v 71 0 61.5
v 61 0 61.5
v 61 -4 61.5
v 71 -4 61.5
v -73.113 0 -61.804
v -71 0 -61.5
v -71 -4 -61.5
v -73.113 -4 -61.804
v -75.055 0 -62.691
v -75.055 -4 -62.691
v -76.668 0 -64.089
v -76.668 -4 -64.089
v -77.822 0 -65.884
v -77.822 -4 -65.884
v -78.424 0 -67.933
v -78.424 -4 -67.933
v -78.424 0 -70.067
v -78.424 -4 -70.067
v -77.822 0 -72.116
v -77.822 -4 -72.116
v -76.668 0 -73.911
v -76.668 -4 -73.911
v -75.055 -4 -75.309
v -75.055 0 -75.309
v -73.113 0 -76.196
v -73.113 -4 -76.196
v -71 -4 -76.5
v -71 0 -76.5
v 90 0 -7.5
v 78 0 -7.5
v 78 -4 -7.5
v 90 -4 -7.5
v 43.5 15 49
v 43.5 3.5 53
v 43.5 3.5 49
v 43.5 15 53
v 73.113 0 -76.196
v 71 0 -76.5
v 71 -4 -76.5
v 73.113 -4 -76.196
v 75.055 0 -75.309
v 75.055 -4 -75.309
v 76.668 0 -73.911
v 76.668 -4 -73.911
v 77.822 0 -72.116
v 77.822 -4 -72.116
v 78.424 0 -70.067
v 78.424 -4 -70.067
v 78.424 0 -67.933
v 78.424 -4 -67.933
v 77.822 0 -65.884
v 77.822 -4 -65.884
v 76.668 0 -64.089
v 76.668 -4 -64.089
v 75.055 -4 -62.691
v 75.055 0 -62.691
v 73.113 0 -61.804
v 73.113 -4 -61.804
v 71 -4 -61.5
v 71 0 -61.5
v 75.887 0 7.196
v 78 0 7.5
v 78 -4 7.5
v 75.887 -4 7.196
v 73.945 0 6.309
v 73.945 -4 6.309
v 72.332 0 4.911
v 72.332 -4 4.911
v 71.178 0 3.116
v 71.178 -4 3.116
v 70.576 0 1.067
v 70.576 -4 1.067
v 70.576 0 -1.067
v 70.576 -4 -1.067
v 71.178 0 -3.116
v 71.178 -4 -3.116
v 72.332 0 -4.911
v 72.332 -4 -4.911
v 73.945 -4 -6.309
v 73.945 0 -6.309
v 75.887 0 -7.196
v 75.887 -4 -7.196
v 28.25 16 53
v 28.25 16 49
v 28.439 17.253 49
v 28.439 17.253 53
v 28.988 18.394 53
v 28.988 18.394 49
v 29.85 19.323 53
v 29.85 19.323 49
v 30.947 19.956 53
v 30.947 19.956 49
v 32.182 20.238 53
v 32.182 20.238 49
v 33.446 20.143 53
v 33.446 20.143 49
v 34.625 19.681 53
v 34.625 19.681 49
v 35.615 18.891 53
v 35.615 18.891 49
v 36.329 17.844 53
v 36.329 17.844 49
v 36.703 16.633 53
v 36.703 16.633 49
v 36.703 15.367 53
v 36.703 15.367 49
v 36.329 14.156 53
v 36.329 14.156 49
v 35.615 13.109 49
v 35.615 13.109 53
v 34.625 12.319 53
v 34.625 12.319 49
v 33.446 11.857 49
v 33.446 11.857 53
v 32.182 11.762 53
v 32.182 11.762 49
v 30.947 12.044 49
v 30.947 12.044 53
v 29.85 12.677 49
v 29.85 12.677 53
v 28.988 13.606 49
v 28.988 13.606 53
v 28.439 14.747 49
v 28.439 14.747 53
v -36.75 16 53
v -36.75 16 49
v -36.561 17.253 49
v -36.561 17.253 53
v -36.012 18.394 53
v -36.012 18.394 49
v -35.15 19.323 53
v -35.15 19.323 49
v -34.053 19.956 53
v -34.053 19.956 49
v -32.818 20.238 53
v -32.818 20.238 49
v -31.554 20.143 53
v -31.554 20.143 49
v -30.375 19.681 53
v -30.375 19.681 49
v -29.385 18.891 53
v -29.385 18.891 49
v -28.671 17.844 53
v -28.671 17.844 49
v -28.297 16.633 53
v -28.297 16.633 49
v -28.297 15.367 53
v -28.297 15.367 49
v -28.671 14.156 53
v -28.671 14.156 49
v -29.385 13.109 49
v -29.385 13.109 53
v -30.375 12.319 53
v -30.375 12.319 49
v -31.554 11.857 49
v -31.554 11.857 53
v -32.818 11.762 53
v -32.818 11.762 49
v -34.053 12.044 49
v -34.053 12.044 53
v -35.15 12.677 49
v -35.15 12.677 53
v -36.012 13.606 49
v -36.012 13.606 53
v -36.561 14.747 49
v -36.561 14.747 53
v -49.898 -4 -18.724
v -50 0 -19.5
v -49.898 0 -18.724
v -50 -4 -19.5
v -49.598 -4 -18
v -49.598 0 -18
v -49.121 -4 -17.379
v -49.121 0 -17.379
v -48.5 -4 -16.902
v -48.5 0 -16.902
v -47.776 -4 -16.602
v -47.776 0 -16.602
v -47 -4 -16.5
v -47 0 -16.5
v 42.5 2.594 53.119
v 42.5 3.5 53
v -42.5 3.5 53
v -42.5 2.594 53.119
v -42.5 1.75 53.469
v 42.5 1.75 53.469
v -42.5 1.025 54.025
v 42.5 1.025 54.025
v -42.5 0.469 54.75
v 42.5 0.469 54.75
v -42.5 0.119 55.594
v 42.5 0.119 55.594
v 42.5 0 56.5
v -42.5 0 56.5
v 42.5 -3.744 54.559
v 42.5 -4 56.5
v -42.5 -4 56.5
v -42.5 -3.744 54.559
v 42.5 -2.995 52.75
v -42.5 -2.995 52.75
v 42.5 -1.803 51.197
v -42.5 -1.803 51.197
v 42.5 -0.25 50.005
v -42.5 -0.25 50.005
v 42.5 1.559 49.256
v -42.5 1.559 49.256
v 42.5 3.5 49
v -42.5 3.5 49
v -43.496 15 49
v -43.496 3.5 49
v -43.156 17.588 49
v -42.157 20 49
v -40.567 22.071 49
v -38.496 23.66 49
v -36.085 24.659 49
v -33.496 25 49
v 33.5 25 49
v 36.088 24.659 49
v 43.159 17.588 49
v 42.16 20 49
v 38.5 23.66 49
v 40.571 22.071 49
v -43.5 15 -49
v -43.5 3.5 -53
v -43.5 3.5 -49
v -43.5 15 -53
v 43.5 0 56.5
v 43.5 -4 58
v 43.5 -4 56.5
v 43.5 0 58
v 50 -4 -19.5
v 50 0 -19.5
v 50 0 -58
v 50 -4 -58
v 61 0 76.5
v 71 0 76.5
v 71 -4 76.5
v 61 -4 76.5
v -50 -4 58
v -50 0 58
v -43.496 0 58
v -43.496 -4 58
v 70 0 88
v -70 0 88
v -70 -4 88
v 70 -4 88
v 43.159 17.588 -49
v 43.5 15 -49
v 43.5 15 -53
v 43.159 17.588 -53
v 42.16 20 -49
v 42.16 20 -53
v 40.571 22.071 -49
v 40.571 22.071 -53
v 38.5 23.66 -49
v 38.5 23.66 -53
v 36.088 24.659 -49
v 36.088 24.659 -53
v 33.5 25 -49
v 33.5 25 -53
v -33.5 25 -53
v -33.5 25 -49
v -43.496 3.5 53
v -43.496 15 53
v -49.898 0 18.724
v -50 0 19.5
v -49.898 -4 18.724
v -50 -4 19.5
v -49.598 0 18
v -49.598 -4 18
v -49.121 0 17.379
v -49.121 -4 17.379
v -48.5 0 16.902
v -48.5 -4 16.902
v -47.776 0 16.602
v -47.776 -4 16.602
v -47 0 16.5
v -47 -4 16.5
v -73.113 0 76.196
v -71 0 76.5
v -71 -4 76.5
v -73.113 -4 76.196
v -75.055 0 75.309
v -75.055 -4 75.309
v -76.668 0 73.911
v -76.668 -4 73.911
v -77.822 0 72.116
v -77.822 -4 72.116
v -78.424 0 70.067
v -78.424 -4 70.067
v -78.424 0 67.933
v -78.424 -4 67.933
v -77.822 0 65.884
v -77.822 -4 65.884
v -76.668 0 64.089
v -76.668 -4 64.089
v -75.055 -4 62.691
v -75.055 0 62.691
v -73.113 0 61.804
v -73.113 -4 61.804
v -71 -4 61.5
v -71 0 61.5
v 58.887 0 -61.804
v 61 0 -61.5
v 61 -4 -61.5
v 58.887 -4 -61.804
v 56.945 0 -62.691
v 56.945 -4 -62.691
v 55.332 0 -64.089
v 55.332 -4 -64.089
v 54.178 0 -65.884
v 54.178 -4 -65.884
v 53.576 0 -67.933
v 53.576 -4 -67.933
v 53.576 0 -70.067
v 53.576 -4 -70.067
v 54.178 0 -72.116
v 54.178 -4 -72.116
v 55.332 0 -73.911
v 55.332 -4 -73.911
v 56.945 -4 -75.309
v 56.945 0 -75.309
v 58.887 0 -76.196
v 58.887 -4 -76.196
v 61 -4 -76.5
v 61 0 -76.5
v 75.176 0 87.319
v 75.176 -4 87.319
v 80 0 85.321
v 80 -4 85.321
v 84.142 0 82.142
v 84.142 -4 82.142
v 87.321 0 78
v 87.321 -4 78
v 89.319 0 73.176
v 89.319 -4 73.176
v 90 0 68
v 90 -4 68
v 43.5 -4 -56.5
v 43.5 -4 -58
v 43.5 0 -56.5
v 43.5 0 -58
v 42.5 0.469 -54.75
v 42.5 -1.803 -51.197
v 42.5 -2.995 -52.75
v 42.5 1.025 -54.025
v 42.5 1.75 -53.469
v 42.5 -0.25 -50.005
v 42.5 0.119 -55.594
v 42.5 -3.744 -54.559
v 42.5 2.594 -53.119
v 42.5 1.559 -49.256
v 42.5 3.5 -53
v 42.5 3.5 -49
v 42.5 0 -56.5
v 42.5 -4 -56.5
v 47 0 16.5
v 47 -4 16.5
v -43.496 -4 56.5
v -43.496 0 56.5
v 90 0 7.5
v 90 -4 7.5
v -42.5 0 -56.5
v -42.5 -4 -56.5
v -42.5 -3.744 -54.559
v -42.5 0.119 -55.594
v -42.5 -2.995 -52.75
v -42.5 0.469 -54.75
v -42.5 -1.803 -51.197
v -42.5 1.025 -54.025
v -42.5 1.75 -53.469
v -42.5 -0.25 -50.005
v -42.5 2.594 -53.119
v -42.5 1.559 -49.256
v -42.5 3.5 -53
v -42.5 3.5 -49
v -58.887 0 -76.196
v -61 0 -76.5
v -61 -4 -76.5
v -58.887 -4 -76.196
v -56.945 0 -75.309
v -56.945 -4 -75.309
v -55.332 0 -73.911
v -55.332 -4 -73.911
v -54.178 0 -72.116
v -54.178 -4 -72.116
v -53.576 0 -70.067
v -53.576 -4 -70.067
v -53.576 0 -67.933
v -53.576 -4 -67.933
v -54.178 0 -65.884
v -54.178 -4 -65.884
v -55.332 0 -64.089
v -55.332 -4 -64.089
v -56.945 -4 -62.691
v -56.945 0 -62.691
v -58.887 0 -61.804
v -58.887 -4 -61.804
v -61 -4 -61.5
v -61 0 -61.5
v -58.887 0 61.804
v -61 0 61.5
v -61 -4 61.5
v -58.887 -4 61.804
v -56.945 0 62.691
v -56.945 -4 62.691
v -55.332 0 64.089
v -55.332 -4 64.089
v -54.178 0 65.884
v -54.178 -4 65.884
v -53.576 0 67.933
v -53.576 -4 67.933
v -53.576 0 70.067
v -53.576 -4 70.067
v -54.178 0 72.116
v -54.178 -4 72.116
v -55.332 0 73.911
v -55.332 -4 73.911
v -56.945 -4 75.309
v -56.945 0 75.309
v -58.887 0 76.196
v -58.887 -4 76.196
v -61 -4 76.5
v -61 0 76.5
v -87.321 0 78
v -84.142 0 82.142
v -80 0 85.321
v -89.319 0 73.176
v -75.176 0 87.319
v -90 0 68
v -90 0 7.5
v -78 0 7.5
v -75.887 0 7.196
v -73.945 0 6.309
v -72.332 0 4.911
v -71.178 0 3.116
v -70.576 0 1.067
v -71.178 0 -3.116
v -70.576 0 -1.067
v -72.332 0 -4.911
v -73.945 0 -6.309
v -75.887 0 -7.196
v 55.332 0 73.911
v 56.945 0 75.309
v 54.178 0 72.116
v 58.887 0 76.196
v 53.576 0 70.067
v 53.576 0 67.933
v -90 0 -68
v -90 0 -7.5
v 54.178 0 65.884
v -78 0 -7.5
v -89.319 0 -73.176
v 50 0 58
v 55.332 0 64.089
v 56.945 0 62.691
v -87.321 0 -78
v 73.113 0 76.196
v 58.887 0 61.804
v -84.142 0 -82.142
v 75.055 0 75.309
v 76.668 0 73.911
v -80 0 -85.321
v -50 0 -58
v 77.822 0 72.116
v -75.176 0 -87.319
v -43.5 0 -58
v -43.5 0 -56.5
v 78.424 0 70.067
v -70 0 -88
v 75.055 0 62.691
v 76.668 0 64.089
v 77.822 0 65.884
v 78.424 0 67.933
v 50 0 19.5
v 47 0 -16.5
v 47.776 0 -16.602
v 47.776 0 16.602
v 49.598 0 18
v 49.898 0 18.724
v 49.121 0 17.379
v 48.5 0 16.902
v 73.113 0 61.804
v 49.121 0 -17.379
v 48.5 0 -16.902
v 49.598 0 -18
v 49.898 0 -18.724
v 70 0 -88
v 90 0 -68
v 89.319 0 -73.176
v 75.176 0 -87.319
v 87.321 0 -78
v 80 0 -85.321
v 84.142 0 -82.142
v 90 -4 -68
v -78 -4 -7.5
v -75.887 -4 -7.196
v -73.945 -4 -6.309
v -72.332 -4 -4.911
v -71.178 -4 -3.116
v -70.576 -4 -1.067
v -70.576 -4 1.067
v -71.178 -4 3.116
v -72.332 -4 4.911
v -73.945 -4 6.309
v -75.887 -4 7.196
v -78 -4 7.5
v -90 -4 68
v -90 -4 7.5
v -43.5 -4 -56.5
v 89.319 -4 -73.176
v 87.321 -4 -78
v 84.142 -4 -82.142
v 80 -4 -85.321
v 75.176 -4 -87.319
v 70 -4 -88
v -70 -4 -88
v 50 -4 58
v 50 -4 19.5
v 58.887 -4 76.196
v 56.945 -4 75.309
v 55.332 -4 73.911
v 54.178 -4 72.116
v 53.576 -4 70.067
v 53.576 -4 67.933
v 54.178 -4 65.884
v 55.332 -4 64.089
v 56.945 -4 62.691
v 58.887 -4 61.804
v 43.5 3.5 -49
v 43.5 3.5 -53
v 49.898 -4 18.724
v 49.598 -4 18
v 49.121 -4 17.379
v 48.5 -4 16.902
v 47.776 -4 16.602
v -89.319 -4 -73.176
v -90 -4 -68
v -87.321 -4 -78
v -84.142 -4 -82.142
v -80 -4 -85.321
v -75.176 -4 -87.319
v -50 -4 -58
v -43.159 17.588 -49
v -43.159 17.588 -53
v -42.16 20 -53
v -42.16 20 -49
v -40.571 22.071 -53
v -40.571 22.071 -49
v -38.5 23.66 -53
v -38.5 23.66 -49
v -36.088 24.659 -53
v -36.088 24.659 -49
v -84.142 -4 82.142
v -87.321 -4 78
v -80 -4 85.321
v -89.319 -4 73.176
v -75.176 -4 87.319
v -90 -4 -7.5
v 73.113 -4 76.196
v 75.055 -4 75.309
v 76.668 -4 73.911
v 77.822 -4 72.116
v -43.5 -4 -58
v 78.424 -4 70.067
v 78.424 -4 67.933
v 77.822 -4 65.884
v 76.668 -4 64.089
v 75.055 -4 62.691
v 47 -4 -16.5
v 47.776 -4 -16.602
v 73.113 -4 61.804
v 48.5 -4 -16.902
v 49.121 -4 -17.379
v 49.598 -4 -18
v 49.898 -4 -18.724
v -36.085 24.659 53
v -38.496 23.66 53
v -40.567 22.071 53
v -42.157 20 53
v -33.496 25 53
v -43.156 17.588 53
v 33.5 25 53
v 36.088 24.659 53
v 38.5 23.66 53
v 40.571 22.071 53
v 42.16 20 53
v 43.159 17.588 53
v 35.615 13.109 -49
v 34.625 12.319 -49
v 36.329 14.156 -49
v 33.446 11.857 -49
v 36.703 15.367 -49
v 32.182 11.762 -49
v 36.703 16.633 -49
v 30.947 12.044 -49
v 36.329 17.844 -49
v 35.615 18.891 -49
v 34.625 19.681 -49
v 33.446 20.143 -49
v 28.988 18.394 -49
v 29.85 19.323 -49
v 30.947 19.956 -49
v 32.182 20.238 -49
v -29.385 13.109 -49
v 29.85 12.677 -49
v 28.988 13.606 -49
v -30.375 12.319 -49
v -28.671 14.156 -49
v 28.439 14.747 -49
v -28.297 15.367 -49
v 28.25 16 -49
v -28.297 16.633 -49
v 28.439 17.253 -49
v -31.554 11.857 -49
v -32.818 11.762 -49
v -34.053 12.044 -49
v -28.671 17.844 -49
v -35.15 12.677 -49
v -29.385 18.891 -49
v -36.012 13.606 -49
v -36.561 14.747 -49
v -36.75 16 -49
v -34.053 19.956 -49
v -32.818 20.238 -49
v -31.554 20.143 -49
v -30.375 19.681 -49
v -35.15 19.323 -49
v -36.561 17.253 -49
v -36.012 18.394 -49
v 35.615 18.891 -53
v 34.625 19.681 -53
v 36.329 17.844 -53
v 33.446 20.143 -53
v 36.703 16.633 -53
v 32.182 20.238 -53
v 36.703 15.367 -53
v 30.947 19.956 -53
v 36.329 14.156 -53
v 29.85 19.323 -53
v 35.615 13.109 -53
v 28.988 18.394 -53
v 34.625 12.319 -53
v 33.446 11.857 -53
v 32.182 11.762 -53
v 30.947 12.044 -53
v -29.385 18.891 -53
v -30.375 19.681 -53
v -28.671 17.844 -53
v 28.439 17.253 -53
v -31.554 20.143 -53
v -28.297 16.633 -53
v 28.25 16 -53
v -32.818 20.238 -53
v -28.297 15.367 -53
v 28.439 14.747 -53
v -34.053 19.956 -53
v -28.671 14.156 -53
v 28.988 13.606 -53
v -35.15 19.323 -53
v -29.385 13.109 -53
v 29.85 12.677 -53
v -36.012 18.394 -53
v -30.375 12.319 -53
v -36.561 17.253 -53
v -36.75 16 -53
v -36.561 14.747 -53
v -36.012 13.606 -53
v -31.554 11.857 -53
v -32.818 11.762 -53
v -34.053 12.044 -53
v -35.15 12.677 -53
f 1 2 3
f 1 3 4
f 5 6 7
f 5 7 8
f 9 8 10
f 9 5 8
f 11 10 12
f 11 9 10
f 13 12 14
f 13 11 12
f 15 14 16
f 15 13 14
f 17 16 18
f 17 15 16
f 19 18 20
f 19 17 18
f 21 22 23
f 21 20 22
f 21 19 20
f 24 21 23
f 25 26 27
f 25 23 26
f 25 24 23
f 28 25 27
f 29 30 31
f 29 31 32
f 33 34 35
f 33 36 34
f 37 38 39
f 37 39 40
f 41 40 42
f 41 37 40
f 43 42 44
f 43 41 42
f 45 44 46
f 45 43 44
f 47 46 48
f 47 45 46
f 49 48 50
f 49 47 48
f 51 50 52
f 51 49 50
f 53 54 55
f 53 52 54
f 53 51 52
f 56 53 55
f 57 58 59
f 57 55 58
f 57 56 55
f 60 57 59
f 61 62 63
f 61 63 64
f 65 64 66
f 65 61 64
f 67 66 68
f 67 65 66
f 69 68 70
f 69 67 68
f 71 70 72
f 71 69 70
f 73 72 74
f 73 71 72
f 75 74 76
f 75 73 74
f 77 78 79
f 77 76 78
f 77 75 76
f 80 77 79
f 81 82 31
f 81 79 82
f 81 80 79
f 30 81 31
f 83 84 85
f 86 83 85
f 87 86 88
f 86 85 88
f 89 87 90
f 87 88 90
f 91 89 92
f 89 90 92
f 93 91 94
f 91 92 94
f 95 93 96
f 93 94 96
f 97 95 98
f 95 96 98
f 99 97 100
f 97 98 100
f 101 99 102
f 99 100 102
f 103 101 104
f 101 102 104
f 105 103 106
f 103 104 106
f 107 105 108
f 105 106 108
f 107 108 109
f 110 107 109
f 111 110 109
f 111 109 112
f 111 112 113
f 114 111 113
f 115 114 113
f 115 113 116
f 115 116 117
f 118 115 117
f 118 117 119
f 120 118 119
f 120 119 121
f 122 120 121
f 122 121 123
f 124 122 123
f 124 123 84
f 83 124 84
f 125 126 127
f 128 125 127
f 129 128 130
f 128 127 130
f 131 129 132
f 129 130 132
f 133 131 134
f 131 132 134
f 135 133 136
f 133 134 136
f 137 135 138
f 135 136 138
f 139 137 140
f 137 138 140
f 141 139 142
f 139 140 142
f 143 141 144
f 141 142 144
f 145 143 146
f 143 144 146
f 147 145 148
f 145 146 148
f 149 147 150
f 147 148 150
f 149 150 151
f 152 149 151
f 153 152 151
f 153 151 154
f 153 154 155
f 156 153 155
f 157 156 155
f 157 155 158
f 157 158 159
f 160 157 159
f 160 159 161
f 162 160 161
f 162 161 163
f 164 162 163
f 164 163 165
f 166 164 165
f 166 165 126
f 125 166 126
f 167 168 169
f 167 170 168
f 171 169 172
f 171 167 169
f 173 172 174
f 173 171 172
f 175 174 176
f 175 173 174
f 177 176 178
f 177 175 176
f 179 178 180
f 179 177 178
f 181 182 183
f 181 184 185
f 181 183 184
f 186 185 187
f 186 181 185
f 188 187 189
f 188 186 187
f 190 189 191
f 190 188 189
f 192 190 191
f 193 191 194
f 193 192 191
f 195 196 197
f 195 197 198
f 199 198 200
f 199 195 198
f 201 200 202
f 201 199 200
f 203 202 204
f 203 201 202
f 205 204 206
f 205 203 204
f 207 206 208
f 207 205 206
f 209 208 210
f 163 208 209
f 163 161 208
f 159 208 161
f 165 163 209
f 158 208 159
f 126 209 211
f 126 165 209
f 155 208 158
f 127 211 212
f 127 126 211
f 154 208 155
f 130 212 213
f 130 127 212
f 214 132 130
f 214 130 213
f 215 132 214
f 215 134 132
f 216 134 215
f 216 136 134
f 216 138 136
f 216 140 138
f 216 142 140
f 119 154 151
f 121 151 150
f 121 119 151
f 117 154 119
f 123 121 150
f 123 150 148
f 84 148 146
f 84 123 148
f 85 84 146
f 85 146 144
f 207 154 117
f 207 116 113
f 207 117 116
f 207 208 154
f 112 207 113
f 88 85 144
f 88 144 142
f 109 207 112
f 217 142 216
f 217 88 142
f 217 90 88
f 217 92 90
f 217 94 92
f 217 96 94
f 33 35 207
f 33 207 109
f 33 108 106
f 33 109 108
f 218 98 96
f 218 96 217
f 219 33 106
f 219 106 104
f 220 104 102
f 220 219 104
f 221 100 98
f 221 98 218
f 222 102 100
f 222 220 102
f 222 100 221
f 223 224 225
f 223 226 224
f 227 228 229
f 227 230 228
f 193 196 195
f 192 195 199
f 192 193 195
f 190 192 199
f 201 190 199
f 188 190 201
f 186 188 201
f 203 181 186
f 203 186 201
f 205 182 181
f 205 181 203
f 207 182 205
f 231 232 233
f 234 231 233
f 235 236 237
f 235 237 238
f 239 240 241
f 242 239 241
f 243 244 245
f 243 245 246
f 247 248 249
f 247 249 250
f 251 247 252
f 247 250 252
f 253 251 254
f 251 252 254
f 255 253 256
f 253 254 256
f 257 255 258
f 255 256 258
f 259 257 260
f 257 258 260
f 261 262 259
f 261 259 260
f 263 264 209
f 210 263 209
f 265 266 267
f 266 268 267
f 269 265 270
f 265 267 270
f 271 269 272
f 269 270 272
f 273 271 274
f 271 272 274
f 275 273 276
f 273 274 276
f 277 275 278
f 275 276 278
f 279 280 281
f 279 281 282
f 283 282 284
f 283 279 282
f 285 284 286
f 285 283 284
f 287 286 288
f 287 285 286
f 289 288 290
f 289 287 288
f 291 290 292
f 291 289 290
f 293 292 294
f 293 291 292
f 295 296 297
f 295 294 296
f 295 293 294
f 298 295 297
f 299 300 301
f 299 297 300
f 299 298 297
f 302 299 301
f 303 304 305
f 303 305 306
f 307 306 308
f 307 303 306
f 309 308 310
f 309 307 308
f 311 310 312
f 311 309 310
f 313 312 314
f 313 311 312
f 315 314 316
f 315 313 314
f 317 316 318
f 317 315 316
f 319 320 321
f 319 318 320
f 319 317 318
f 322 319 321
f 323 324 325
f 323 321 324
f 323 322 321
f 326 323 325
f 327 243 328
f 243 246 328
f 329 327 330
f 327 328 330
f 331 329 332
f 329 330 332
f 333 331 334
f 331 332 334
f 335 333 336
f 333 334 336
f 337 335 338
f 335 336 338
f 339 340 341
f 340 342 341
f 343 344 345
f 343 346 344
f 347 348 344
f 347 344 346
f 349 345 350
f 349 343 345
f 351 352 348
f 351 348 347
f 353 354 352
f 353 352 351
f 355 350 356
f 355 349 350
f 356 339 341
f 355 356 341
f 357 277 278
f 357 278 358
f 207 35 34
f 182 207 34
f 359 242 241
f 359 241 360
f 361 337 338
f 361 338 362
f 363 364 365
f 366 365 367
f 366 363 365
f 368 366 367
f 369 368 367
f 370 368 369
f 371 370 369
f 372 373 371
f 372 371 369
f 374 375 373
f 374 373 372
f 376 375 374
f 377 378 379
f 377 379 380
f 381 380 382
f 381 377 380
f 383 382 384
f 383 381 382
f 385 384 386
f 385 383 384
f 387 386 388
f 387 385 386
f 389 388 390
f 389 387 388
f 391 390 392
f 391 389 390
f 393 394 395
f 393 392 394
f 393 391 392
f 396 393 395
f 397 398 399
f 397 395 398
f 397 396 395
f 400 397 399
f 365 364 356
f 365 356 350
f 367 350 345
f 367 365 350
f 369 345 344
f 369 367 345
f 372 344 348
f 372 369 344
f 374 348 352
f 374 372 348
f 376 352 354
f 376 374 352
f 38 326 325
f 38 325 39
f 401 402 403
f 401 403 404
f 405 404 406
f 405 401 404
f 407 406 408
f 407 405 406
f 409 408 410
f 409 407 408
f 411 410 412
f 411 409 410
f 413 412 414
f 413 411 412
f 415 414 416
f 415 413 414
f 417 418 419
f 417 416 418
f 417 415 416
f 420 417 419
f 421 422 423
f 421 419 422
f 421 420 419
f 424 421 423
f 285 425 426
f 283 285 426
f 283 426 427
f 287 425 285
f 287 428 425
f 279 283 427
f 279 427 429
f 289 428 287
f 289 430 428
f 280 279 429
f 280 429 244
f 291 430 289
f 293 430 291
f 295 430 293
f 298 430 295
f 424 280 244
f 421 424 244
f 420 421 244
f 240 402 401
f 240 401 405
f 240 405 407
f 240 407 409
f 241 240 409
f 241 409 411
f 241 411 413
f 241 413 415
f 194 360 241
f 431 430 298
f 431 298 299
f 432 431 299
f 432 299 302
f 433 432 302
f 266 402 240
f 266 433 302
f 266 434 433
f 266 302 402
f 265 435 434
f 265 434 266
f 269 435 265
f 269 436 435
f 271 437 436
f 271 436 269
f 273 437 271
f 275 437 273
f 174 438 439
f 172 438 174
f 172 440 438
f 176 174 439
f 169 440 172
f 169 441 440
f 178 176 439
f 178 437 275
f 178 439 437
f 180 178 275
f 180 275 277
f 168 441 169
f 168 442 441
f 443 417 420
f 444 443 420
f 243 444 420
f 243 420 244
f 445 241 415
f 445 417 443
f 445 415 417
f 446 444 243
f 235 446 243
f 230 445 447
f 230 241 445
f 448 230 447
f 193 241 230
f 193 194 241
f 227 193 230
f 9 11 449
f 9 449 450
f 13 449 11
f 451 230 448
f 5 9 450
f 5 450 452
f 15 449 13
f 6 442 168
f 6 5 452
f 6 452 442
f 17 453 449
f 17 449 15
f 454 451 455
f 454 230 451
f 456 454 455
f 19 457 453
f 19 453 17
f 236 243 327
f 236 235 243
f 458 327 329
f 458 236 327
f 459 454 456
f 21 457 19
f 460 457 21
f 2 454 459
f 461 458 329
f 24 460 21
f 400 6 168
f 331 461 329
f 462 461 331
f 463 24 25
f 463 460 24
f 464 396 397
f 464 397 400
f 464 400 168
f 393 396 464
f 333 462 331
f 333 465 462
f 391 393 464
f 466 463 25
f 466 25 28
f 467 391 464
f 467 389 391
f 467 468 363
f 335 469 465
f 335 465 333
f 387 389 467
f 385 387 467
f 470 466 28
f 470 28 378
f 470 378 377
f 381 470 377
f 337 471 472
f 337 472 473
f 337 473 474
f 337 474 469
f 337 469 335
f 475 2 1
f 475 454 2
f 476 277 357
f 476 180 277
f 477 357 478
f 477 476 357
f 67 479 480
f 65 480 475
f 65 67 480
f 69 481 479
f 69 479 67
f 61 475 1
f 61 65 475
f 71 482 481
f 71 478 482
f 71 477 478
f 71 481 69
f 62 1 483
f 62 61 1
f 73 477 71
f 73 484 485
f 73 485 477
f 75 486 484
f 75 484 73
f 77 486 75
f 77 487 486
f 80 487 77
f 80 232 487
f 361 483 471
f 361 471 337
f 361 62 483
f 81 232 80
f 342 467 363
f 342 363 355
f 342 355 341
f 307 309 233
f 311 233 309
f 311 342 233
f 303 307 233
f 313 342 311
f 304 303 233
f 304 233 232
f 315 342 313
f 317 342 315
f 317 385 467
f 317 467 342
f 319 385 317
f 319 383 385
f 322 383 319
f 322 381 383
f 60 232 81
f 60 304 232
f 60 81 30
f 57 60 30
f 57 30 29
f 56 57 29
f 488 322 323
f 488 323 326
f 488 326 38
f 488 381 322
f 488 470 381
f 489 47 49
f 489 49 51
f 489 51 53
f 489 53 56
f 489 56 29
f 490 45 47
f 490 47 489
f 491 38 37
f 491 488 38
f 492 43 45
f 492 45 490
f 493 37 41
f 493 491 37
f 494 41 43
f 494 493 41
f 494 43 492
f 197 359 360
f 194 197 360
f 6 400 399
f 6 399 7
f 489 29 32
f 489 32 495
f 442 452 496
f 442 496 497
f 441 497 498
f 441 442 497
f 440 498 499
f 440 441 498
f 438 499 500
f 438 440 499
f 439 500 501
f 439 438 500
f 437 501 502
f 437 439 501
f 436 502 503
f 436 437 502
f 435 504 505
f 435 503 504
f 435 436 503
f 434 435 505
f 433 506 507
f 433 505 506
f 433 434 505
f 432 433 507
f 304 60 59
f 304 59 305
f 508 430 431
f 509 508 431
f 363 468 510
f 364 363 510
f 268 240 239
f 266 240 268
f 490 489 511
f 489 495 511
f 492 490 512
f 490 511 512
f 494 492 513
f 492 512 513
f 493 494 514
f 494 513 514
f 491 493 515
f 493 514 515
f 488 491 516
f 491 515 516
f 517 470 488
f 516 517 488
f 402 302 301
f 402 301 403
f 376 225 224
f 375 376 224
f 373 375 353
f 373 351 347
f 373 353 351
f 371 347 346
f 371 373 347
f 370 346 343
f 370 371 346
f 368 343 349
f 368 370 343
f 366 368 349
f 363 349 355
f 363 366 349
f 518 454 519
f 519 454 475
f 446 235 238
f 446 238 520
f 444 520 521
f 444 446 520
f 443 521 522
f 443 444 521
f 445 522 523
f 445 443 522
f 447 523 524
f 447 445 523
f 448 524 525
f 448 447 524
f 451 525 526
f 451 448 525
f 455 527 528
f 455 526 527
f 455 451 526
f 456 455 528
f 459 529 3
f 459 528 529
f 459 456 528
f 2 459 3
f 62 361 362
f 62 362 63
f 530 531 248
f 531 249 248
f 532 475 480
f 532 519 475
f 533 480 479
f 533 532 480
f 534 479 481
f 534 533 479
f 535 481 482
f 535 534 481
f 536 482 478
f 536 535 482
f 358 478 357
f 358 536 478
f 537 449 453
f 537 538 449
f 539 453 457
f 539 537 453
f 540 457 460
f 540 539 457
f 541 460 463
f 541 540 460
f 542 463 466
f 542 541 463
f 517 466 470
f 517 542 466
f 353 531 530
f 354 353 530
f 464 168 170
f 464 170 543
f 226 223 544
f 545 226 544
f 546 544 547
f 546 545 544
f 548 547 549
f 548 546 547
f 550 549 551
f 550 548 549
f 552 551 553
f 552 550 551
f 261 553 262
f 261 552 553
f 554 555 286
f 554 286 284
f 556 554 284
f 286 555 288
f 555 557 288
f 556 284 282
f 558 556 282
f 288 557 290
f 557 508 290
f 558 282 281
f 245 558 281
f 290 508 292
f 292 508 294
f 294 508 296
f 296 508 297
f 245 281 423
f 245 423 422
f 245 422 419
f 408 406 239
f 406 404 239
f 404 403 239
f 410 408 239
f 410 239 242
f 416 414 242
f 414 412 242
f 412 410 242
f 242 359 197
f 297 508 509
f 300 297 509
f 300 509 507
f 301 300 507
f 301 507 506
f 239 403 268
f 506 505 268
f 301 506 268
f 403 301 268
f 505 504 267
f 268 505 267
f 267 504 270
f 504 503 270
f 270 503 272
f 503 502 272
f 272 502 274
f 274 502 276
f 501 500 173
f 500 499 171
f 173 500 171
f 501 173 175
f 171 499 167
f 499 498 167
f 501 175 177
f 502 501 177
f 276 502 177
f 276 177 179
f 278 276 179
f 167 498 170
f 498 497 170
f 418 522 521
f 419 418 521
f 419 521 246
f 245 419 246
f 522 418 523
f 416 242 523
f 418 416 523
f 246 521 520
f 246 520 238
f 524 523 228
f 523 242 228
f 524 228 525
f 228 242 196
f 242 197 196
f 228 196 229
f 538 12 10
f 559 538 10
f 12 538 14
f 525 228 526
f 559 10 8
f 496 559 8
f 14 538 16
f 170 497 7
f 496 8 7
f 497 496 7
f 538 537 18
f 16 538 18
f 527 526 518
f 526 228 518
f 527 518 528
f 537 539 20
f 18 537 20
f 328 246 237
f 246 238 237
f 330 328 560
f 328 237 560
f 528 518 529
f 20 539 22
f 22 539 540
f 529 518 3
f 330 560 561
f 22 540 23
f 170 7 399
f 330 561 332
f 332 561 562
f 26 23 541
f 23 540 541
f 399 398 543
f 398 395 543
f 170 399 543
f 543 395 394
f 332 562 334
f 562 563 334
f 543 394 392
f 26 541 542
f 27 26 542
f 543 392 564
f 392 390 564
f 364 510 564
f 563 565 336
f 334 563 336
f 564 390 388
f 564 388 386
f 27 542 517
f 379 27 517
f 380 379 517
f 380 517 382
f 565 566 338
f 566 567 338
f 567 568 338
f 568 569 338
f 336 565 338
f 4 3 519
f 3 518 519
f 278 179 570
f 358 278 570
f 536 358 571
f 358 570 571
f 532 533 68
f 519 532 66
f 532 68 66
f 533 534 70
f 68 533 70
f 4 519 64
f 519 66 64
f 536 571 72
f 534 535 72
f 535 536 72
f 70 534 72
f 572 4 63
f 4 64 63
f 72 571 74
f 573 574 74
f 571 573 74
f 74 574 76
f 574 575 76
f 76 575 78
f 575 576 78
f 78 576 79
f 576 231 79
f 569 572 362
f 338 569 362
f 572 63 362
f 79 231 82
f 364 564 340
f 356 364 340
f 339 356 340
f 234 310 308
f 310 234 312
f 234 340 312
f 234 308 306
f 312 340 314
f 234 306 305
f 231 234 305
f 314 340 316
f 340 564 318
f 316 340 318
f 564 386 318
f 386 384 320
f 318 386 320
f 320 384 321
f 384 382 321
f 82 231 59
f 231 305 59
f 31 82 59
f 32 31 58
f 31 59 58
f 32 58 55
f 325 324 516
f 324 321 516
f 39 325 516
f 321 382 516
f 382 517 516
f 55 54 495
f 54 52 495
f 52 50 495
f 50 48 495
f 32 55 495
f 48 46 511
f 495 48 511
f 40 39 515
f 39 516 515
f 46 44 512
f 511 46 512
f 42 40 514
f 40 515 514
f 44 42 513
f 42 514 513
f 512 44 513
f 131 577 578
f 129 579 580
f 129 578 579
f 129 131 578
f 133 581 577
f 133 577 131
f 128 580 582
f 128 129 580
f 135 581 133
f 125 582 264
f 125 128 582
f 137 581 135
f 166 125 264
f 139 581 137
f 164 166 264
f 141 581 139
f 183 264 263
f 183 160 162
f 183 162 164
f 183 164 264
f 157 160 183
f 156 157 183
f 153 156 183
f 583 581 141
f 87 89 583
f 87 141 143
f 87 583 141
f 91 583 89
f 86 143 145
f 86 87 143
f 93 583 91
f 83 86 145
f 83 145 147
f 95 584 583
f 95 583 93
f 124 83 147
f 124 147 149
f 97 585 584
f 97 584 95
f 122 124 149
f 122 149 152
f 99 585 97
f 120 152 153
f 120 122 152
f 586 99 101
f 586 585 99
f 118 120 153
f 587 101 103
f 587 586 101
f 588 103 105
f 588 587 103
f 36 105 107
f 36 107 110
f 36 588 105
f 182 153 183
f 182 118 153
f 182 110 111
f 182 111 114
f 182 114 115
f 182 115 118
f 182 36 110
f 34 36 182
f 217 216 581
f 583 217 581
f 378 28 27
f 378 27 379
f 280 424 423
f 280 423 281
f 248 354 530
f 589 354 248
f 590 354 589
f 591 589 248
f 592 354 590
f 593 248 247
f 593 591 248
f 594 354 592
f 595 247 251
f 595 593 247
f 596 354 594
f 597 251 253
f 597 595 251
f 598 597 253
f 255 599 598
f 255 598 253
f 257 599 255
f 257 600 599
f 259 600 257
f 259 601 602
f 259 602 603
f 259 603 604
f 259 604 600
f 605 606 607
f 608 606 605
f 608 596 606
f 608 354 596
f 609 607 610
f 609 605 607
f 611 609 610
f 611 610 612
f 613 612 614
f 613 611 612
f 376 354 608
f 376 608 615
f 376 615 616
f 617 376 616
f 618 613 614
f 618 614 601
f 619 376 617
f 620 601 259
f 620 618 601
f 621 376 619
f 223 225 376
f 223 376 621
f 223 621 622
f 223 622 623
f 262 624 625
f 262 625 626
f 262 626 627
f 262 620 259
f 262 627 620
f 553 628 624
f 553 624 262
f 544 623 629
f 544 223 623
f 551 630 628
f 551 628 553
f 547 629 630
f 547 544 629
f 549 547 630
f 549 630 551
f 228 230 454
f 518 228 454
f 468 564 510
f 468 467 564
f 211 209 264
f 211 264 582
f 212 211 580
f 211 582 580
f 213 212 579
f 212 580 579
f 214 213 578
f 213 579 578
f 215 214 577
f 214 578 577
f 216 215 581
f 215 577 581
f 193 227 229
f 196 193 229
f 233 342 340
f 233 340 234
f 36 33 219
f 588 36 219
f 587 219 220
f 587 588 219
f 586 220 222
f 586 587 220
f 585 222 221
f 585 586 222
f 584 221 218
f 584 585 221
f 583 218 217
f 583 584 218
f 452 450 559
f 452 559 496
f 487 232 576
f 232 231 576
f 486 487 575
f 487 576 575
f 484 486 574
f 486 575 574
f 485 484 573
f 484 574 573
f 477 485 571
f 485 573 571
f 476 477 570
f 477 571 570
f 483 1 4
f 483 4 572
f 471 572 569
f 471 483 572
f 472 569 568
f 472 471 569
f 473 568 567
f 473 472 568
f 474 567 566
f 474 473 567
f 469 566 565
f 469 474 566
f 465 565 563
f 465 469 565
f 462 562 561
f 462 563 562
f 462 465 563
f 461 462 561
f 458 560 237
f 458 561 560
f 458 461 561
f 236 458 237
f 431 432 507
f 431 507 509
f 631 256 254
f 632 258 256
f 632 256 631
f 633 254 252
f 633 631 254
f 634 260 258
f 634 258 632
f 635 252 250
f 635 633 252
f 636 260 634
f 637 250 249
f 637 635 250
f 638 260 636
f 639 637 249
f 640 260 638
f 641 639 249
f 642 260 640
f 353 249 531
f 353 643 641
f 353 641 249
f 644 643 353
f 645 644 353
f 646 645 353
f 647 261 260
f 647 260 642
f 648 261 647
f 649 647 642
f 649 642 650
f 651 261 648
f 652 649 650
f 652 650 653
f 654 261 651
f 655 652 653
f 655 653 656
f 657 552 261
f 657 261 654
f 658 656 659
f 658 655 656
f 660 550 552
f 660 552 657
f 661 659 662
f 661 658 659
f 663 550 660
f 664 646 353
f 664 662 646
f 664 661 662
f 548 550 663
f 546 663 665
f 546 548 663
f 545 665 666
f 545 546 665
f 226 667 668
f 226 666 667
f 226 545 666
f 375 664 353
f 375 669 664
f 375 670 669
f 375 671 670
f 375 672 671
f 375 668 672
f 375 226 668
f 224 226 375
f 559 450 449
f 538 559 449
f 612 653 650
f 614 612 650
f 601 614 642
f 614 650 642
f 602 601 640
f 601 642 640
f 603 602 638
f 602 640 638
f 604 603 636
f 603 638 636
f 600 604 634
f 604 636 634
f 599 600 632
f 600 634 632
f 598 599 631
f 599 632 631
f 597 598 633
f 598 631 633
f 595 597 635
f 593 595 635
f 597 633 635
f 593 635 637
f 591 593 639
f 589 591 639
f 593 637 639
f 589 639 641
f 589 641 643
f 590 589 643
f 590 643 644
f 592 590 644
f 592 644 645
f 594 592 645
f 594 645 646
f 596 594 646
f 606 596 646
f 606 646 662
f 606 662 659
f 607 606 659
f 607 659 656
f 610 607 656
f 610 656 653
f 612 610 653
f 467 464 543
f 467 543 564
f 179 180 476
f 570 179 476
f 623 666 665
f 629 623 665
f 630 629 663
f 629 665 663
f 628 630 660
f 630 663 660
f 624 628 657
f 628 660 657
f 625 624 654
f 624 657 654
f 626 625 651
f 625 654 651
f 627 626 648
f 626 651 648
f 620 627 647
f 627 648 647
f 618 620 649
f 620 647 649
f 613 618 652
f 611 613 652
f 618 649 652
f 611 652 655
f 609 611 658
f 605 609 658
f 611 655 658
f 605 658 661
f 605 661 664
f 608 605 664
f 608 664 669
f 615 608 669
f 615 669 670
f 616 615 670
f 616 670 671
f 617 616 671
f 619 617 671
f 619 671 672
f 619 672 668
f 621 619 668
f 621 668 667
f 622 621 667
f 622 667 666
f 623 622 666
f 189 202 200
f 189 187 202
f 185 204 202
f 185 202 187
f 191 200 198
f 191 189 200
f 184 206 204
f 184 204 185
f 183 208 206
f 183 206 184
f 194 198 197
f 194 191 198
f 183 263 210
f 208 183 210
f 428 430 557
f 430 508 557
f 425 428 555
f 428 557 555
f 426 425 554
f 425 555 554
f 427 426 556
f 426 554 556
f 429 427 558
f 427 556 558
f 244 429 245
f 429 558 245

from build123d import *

# Parameters (mm, degrees)
IZIM1_W                 = 180
IZIM1_H                 = 176
TABAN_FLAN_1_DEPTH      = 4
RADYUS1_R               = 20
KES_EKSTR_ZYON1_DEPTH   = 10
IZIM7_W                 = 100
IZIM7_H                 = 116
KES_EKSTR_ZYON2_DEPTH   = 10
KENAR_FLAN_1_DEPTH      = 86.996406433
KENAR_FLAN_1_BEND_DEPTH = 87
IZIM14_R                = 4.25
KES_EKSTR_ZYON3_DEPTH   = 146
RADYUS2_R               = 10
IZIM15_W                = 125
IZIM15_H                = 33
SEKME1_DEPTH            = 4
RADYUS3_R               = 3
KES_EKSTR_ZYON4_DEPTH   = 1
KES_EKSTR_ZYON5_DEPTH   = 1
KES_EKSTR_ZYON6_DEPTH   = 10


# Sheet-metal steps are written as plain solids
with BuildPart() as part:
    # Çizim1 → Taban-Flanş1 (new body)
    with BuildSketch(Plane(origin=(0, 0, 0), x_dir=(1, 0, 0), z_dir=(0, 1, 0))):
        Rectangle(IZIM1_W, IZIM1_H)
    extrude(amount=-TABAN_FLAN_1_DEPTH)

    # Radyus1
    radyus1_edges = [part.edges().sort_by_distance(p)[0] for p in [
        (-90, -2, -88),
        (90, -2, -88),
        (90, -2, 88),
        (-90, -2, 88),
    ]]
    fillet(radyus1_edges, radius=RADYUS1_R)

    # Çizim6 → Kes-Ekstrüzyon1 (cut)
    with BuildSketch(Plane(origin=(0, 0, 0), x_dir=(1, 0, 0), z_dir=(0, 1, 0))):
        with BuildLine():
            Line((-71, -61.5), (-61, -61.5))
            ThreePointArc((-61, -61.5), (-53.5, -69), (-61, -76.5))
            Line((-61, -76.5), (-71, -76.5))
            ThreePointArc((-71, -76.5), (-78.5, -69), (-71, -61.5))
        make_face()
        with BuildLine():
            Line((-71, 76.5), (-61, 76.5))
            ThreePointArc((-61, 76.5), (-53.5, 69), (-61, 61.5))
            Line((-61, 61.5), (-71, 61.5))
            ThreePointArc((-71, 61.5), (-78.5, 69), (-71, 76.5))
        make_face()
        with BuildLine():
            Line((71, 61.5), (61, 61.5))
            ThreePointArc((61, 61.5), (53.5, 69), (61, 76.5))
            Line((61, 76.5), (71, 76.5))
            ThreePointArc((71, 76.5), (78.5, 69), (71, 61.5))
        make_face()
        with BuildLine():
            Line((71, -76.5), (61, -76.5))
            ThreePointArc((61, -76.5), (53.5, -69), (61, -61.5))
            Line((61, -61.5), (71, -61.5))
            ThreePointArc((71, -61.5), (78.5, -69), (71, -76.5))
        make_face()
    extrude(amount=-KES_EKSTR_ZYON1_DEPTH, mode=Mode.SUBTRACT)

    # Çizim7 → Kes-Ekstrüzyon2 (cut)
    with BuildSketch(Plane(origin=(0, 0, 0), x_dir=(1, 0, 0), z_dir=(0, 1, 0))):
        Rectangle(IZIM7_W, IZIM7_H)
    extrude(amount=-KES_EKSTR_ZYON2_DEPTH, mode=Mode.SUBTRACT)

    # Kenar-Flanş1 section (across the edge) → Kenar-Flanş1 (add)
    with BuildSketch(Plane(origin=(43.5, 0, 53), x_dir=(0, 0, 1), z_dir=(-1, 0, 0))):
        with BuildLine():
            Line((-4, 3.5), (-4, 25))
            Line((-4, 25), (0, 25))
            Line((0, 25), (0, 3.5))
            ThreePointArc((0, 3.5), (1.025126266, 1.025126266), (3.5, 0))
            Line((3.5, 0), (5, 0))
            Line((5, 0), (5, -4))
            Line((5, -4), (3.5, -4))
            ThreePointArc((3.5, -4), (-1.803300859, -1.803300859), (-4, 3.5))
        make_face()
    extrude(amount=KENAR_FLAN_1_DEPTH)

    # Kenar-Flanş1 section 2 (across the edge) → Kenar-Flanş1 bend (add)
    with BuildSketch(Plane(origin=(-43.5, 0, -53), x_dir=(0, 0, -1), z_dir=(1, 0, 0))):
        with BuildLine():
            Line((-4, 3.5), (-4, 25))
            Line((-4, 25), (0, 25))
            Line((0, 25), (0, 3.5))
            ThreePointArc((0, 3.5), (1.025126266, 1.025126266), (3.5, 0))
            Line((3.5, 0), (5, 0))
            Line((5, 0), (5, -4))
            Line((5, -4), (3.5, -4))
            ThreePointArc((3.5, -4), (-1.803300859, -1.803300859), (-4, 3.5))
        make_face()
    extrude(amount=KENAR_FLAN_1_BEND_DEPTH)

    # Çizim14 → Kes-Ekstrüzyon3 (cut)
    with BuildSketch(Plane(origin=(0, 0, -53), x_dir=(-1, 0, 0), z_dir=(0, 0, -1))):
        with Locations((-32.5, 16)):
            Circle(IZIM14_R)
        with Locations((32.5, 16)):
            Circle(IZIM14_R)
    extrude(amount=-KES_EKSTR_ZYON3_DEPTH, mode=Mode.SUBTRACT)

    # Radyus2
    radyus2_edges = [part.edges().sort_by_distance(p)[0] for p in [
        (43.5, 25, 51),
        (-43.496406433, 25, 51),
        (-43.5, 25, -51),
        (43.5, 25, -51),
    ]]
    fillet(radyus2_edges, radius=RADYUS2_R)

    # Çizim15 → Sekme1 (add)
    with BuildSketch(Plane(origin=(0, 0, 0), x_dir=(1, 0, 0), z_dir=(0, 1, 0))):
        Rectangle(IZIM15_W, IZIM15_H)
    extrude(amount=-SEKME1_DEPTH)

    # Radyus3
    radyus3_edges = [part.edges().sort_by_distance(p)[0] for p in [
        (-50, -2, 16.5),
        (-50, -2, -16.5),
        (50, -2, -16.5),
        (50, -2, 16.5),
    ]]
    fillet(radyus3_edges, radius=RADYUS3_R)

    # Çizim18 → Kes-Ekstrüzyon4 (cut)
    with BuildSketch(Plane(origin=(43.5, 0, 0), x_dir=(0, 0, -1), z_dir=(1, 0, 0))):
        with BuildLine():
            Line((53, 3.5), (49, 3.5))
            ThreePointArc((49, 3.5), (51.196699141, -1.803300859), (56.5, -4))
            Line((56.5, -4), (56.5, 0))
            ThreePointArc((56.5, 0), (54.025126266, 1.025126266), (53, 3.5))
        make_face()
        with BuildLine():
            Line((-49, 3.5), (-53, 3.5))
            ThreePointArc((-53, 3.5), (-54.025126266, 1.025126266), (-56.5, 0))
            Line((-56.5, 0), (-56.5, -4))
            ThreePointArc((-56.5, -4), (-51.196699141, -1.803300859), (-49, 3.5))
        make_face()
    extrude(amount=-KES_EKSTR_ZYON4_DEPTH, mode=Mode.SUBTRACT)

    # Çizim19 → Kes-Ekstrüzyon5 (cut)
    with BuildSketch(Plane.ZY.offset(43.5)):
        with BuildLine():
            Line((-49, 3.5), (-53, 3.5))
            ThreePointArc((-53, 3.5), (-54.025126266, 1.025126266), (-56.5, 0))
            Line((-56.5, 0), (-56.5, -4))
            ThreePointArc((-56.5, -4), (-51.196699141, -1.803300859), (-49, 3.5))
        make_face()
        with BuildLine():
            Line((53, 3.5), (49, 3.5))
            ThreePointArc((49, 3.5), (51.196699141, -1.803300859), (56.5, -4))
            Line((56.5, -4), (56.5, 0))
            ThreePointArc((56.5, 0), (54.025126266, 1.025126266), (53, 3.5))
        make_face()
    extrude(amount=-KES_EKSTR_ZYON5_DEPTH, mode=Mode.SUBTRACT)

    # Çizim20 → Kes-Ekstrüzyon6 (cut)
    with BuildSketch(Plane(origin=(0, 0, 0), x_dir=(1, 0, 0), z_dir=(0, 1, 0))):
        with BuildLine():
            Line((102, -7.5), (78, -7.5))
            ThreePointArc((78, -7.5), (70.5, 0), (78, 7.5))
            Line((78, 7.5), (102, 7.5))
            ThreePointArc((102, 7.5), (109.5, 0), (102, -7.5))
        make_face()
        with BuildLine():
            Line((-102, 7.5), (-78, 7.5))
            ThreePointArc((-78, 7.5), (-70.5, 0), (-78, -7.5))
            Line((-78, -7.5), (-102, -7.5))
            ThreePointArc((-102, -7.5), (-109.5, 0), (-102, 7.5))
        make_face()
    extrude(amount=-KES_EKSTR_ZYON6_DEPTH, mode=Mode.SUBTRACT)


solid = part.part
